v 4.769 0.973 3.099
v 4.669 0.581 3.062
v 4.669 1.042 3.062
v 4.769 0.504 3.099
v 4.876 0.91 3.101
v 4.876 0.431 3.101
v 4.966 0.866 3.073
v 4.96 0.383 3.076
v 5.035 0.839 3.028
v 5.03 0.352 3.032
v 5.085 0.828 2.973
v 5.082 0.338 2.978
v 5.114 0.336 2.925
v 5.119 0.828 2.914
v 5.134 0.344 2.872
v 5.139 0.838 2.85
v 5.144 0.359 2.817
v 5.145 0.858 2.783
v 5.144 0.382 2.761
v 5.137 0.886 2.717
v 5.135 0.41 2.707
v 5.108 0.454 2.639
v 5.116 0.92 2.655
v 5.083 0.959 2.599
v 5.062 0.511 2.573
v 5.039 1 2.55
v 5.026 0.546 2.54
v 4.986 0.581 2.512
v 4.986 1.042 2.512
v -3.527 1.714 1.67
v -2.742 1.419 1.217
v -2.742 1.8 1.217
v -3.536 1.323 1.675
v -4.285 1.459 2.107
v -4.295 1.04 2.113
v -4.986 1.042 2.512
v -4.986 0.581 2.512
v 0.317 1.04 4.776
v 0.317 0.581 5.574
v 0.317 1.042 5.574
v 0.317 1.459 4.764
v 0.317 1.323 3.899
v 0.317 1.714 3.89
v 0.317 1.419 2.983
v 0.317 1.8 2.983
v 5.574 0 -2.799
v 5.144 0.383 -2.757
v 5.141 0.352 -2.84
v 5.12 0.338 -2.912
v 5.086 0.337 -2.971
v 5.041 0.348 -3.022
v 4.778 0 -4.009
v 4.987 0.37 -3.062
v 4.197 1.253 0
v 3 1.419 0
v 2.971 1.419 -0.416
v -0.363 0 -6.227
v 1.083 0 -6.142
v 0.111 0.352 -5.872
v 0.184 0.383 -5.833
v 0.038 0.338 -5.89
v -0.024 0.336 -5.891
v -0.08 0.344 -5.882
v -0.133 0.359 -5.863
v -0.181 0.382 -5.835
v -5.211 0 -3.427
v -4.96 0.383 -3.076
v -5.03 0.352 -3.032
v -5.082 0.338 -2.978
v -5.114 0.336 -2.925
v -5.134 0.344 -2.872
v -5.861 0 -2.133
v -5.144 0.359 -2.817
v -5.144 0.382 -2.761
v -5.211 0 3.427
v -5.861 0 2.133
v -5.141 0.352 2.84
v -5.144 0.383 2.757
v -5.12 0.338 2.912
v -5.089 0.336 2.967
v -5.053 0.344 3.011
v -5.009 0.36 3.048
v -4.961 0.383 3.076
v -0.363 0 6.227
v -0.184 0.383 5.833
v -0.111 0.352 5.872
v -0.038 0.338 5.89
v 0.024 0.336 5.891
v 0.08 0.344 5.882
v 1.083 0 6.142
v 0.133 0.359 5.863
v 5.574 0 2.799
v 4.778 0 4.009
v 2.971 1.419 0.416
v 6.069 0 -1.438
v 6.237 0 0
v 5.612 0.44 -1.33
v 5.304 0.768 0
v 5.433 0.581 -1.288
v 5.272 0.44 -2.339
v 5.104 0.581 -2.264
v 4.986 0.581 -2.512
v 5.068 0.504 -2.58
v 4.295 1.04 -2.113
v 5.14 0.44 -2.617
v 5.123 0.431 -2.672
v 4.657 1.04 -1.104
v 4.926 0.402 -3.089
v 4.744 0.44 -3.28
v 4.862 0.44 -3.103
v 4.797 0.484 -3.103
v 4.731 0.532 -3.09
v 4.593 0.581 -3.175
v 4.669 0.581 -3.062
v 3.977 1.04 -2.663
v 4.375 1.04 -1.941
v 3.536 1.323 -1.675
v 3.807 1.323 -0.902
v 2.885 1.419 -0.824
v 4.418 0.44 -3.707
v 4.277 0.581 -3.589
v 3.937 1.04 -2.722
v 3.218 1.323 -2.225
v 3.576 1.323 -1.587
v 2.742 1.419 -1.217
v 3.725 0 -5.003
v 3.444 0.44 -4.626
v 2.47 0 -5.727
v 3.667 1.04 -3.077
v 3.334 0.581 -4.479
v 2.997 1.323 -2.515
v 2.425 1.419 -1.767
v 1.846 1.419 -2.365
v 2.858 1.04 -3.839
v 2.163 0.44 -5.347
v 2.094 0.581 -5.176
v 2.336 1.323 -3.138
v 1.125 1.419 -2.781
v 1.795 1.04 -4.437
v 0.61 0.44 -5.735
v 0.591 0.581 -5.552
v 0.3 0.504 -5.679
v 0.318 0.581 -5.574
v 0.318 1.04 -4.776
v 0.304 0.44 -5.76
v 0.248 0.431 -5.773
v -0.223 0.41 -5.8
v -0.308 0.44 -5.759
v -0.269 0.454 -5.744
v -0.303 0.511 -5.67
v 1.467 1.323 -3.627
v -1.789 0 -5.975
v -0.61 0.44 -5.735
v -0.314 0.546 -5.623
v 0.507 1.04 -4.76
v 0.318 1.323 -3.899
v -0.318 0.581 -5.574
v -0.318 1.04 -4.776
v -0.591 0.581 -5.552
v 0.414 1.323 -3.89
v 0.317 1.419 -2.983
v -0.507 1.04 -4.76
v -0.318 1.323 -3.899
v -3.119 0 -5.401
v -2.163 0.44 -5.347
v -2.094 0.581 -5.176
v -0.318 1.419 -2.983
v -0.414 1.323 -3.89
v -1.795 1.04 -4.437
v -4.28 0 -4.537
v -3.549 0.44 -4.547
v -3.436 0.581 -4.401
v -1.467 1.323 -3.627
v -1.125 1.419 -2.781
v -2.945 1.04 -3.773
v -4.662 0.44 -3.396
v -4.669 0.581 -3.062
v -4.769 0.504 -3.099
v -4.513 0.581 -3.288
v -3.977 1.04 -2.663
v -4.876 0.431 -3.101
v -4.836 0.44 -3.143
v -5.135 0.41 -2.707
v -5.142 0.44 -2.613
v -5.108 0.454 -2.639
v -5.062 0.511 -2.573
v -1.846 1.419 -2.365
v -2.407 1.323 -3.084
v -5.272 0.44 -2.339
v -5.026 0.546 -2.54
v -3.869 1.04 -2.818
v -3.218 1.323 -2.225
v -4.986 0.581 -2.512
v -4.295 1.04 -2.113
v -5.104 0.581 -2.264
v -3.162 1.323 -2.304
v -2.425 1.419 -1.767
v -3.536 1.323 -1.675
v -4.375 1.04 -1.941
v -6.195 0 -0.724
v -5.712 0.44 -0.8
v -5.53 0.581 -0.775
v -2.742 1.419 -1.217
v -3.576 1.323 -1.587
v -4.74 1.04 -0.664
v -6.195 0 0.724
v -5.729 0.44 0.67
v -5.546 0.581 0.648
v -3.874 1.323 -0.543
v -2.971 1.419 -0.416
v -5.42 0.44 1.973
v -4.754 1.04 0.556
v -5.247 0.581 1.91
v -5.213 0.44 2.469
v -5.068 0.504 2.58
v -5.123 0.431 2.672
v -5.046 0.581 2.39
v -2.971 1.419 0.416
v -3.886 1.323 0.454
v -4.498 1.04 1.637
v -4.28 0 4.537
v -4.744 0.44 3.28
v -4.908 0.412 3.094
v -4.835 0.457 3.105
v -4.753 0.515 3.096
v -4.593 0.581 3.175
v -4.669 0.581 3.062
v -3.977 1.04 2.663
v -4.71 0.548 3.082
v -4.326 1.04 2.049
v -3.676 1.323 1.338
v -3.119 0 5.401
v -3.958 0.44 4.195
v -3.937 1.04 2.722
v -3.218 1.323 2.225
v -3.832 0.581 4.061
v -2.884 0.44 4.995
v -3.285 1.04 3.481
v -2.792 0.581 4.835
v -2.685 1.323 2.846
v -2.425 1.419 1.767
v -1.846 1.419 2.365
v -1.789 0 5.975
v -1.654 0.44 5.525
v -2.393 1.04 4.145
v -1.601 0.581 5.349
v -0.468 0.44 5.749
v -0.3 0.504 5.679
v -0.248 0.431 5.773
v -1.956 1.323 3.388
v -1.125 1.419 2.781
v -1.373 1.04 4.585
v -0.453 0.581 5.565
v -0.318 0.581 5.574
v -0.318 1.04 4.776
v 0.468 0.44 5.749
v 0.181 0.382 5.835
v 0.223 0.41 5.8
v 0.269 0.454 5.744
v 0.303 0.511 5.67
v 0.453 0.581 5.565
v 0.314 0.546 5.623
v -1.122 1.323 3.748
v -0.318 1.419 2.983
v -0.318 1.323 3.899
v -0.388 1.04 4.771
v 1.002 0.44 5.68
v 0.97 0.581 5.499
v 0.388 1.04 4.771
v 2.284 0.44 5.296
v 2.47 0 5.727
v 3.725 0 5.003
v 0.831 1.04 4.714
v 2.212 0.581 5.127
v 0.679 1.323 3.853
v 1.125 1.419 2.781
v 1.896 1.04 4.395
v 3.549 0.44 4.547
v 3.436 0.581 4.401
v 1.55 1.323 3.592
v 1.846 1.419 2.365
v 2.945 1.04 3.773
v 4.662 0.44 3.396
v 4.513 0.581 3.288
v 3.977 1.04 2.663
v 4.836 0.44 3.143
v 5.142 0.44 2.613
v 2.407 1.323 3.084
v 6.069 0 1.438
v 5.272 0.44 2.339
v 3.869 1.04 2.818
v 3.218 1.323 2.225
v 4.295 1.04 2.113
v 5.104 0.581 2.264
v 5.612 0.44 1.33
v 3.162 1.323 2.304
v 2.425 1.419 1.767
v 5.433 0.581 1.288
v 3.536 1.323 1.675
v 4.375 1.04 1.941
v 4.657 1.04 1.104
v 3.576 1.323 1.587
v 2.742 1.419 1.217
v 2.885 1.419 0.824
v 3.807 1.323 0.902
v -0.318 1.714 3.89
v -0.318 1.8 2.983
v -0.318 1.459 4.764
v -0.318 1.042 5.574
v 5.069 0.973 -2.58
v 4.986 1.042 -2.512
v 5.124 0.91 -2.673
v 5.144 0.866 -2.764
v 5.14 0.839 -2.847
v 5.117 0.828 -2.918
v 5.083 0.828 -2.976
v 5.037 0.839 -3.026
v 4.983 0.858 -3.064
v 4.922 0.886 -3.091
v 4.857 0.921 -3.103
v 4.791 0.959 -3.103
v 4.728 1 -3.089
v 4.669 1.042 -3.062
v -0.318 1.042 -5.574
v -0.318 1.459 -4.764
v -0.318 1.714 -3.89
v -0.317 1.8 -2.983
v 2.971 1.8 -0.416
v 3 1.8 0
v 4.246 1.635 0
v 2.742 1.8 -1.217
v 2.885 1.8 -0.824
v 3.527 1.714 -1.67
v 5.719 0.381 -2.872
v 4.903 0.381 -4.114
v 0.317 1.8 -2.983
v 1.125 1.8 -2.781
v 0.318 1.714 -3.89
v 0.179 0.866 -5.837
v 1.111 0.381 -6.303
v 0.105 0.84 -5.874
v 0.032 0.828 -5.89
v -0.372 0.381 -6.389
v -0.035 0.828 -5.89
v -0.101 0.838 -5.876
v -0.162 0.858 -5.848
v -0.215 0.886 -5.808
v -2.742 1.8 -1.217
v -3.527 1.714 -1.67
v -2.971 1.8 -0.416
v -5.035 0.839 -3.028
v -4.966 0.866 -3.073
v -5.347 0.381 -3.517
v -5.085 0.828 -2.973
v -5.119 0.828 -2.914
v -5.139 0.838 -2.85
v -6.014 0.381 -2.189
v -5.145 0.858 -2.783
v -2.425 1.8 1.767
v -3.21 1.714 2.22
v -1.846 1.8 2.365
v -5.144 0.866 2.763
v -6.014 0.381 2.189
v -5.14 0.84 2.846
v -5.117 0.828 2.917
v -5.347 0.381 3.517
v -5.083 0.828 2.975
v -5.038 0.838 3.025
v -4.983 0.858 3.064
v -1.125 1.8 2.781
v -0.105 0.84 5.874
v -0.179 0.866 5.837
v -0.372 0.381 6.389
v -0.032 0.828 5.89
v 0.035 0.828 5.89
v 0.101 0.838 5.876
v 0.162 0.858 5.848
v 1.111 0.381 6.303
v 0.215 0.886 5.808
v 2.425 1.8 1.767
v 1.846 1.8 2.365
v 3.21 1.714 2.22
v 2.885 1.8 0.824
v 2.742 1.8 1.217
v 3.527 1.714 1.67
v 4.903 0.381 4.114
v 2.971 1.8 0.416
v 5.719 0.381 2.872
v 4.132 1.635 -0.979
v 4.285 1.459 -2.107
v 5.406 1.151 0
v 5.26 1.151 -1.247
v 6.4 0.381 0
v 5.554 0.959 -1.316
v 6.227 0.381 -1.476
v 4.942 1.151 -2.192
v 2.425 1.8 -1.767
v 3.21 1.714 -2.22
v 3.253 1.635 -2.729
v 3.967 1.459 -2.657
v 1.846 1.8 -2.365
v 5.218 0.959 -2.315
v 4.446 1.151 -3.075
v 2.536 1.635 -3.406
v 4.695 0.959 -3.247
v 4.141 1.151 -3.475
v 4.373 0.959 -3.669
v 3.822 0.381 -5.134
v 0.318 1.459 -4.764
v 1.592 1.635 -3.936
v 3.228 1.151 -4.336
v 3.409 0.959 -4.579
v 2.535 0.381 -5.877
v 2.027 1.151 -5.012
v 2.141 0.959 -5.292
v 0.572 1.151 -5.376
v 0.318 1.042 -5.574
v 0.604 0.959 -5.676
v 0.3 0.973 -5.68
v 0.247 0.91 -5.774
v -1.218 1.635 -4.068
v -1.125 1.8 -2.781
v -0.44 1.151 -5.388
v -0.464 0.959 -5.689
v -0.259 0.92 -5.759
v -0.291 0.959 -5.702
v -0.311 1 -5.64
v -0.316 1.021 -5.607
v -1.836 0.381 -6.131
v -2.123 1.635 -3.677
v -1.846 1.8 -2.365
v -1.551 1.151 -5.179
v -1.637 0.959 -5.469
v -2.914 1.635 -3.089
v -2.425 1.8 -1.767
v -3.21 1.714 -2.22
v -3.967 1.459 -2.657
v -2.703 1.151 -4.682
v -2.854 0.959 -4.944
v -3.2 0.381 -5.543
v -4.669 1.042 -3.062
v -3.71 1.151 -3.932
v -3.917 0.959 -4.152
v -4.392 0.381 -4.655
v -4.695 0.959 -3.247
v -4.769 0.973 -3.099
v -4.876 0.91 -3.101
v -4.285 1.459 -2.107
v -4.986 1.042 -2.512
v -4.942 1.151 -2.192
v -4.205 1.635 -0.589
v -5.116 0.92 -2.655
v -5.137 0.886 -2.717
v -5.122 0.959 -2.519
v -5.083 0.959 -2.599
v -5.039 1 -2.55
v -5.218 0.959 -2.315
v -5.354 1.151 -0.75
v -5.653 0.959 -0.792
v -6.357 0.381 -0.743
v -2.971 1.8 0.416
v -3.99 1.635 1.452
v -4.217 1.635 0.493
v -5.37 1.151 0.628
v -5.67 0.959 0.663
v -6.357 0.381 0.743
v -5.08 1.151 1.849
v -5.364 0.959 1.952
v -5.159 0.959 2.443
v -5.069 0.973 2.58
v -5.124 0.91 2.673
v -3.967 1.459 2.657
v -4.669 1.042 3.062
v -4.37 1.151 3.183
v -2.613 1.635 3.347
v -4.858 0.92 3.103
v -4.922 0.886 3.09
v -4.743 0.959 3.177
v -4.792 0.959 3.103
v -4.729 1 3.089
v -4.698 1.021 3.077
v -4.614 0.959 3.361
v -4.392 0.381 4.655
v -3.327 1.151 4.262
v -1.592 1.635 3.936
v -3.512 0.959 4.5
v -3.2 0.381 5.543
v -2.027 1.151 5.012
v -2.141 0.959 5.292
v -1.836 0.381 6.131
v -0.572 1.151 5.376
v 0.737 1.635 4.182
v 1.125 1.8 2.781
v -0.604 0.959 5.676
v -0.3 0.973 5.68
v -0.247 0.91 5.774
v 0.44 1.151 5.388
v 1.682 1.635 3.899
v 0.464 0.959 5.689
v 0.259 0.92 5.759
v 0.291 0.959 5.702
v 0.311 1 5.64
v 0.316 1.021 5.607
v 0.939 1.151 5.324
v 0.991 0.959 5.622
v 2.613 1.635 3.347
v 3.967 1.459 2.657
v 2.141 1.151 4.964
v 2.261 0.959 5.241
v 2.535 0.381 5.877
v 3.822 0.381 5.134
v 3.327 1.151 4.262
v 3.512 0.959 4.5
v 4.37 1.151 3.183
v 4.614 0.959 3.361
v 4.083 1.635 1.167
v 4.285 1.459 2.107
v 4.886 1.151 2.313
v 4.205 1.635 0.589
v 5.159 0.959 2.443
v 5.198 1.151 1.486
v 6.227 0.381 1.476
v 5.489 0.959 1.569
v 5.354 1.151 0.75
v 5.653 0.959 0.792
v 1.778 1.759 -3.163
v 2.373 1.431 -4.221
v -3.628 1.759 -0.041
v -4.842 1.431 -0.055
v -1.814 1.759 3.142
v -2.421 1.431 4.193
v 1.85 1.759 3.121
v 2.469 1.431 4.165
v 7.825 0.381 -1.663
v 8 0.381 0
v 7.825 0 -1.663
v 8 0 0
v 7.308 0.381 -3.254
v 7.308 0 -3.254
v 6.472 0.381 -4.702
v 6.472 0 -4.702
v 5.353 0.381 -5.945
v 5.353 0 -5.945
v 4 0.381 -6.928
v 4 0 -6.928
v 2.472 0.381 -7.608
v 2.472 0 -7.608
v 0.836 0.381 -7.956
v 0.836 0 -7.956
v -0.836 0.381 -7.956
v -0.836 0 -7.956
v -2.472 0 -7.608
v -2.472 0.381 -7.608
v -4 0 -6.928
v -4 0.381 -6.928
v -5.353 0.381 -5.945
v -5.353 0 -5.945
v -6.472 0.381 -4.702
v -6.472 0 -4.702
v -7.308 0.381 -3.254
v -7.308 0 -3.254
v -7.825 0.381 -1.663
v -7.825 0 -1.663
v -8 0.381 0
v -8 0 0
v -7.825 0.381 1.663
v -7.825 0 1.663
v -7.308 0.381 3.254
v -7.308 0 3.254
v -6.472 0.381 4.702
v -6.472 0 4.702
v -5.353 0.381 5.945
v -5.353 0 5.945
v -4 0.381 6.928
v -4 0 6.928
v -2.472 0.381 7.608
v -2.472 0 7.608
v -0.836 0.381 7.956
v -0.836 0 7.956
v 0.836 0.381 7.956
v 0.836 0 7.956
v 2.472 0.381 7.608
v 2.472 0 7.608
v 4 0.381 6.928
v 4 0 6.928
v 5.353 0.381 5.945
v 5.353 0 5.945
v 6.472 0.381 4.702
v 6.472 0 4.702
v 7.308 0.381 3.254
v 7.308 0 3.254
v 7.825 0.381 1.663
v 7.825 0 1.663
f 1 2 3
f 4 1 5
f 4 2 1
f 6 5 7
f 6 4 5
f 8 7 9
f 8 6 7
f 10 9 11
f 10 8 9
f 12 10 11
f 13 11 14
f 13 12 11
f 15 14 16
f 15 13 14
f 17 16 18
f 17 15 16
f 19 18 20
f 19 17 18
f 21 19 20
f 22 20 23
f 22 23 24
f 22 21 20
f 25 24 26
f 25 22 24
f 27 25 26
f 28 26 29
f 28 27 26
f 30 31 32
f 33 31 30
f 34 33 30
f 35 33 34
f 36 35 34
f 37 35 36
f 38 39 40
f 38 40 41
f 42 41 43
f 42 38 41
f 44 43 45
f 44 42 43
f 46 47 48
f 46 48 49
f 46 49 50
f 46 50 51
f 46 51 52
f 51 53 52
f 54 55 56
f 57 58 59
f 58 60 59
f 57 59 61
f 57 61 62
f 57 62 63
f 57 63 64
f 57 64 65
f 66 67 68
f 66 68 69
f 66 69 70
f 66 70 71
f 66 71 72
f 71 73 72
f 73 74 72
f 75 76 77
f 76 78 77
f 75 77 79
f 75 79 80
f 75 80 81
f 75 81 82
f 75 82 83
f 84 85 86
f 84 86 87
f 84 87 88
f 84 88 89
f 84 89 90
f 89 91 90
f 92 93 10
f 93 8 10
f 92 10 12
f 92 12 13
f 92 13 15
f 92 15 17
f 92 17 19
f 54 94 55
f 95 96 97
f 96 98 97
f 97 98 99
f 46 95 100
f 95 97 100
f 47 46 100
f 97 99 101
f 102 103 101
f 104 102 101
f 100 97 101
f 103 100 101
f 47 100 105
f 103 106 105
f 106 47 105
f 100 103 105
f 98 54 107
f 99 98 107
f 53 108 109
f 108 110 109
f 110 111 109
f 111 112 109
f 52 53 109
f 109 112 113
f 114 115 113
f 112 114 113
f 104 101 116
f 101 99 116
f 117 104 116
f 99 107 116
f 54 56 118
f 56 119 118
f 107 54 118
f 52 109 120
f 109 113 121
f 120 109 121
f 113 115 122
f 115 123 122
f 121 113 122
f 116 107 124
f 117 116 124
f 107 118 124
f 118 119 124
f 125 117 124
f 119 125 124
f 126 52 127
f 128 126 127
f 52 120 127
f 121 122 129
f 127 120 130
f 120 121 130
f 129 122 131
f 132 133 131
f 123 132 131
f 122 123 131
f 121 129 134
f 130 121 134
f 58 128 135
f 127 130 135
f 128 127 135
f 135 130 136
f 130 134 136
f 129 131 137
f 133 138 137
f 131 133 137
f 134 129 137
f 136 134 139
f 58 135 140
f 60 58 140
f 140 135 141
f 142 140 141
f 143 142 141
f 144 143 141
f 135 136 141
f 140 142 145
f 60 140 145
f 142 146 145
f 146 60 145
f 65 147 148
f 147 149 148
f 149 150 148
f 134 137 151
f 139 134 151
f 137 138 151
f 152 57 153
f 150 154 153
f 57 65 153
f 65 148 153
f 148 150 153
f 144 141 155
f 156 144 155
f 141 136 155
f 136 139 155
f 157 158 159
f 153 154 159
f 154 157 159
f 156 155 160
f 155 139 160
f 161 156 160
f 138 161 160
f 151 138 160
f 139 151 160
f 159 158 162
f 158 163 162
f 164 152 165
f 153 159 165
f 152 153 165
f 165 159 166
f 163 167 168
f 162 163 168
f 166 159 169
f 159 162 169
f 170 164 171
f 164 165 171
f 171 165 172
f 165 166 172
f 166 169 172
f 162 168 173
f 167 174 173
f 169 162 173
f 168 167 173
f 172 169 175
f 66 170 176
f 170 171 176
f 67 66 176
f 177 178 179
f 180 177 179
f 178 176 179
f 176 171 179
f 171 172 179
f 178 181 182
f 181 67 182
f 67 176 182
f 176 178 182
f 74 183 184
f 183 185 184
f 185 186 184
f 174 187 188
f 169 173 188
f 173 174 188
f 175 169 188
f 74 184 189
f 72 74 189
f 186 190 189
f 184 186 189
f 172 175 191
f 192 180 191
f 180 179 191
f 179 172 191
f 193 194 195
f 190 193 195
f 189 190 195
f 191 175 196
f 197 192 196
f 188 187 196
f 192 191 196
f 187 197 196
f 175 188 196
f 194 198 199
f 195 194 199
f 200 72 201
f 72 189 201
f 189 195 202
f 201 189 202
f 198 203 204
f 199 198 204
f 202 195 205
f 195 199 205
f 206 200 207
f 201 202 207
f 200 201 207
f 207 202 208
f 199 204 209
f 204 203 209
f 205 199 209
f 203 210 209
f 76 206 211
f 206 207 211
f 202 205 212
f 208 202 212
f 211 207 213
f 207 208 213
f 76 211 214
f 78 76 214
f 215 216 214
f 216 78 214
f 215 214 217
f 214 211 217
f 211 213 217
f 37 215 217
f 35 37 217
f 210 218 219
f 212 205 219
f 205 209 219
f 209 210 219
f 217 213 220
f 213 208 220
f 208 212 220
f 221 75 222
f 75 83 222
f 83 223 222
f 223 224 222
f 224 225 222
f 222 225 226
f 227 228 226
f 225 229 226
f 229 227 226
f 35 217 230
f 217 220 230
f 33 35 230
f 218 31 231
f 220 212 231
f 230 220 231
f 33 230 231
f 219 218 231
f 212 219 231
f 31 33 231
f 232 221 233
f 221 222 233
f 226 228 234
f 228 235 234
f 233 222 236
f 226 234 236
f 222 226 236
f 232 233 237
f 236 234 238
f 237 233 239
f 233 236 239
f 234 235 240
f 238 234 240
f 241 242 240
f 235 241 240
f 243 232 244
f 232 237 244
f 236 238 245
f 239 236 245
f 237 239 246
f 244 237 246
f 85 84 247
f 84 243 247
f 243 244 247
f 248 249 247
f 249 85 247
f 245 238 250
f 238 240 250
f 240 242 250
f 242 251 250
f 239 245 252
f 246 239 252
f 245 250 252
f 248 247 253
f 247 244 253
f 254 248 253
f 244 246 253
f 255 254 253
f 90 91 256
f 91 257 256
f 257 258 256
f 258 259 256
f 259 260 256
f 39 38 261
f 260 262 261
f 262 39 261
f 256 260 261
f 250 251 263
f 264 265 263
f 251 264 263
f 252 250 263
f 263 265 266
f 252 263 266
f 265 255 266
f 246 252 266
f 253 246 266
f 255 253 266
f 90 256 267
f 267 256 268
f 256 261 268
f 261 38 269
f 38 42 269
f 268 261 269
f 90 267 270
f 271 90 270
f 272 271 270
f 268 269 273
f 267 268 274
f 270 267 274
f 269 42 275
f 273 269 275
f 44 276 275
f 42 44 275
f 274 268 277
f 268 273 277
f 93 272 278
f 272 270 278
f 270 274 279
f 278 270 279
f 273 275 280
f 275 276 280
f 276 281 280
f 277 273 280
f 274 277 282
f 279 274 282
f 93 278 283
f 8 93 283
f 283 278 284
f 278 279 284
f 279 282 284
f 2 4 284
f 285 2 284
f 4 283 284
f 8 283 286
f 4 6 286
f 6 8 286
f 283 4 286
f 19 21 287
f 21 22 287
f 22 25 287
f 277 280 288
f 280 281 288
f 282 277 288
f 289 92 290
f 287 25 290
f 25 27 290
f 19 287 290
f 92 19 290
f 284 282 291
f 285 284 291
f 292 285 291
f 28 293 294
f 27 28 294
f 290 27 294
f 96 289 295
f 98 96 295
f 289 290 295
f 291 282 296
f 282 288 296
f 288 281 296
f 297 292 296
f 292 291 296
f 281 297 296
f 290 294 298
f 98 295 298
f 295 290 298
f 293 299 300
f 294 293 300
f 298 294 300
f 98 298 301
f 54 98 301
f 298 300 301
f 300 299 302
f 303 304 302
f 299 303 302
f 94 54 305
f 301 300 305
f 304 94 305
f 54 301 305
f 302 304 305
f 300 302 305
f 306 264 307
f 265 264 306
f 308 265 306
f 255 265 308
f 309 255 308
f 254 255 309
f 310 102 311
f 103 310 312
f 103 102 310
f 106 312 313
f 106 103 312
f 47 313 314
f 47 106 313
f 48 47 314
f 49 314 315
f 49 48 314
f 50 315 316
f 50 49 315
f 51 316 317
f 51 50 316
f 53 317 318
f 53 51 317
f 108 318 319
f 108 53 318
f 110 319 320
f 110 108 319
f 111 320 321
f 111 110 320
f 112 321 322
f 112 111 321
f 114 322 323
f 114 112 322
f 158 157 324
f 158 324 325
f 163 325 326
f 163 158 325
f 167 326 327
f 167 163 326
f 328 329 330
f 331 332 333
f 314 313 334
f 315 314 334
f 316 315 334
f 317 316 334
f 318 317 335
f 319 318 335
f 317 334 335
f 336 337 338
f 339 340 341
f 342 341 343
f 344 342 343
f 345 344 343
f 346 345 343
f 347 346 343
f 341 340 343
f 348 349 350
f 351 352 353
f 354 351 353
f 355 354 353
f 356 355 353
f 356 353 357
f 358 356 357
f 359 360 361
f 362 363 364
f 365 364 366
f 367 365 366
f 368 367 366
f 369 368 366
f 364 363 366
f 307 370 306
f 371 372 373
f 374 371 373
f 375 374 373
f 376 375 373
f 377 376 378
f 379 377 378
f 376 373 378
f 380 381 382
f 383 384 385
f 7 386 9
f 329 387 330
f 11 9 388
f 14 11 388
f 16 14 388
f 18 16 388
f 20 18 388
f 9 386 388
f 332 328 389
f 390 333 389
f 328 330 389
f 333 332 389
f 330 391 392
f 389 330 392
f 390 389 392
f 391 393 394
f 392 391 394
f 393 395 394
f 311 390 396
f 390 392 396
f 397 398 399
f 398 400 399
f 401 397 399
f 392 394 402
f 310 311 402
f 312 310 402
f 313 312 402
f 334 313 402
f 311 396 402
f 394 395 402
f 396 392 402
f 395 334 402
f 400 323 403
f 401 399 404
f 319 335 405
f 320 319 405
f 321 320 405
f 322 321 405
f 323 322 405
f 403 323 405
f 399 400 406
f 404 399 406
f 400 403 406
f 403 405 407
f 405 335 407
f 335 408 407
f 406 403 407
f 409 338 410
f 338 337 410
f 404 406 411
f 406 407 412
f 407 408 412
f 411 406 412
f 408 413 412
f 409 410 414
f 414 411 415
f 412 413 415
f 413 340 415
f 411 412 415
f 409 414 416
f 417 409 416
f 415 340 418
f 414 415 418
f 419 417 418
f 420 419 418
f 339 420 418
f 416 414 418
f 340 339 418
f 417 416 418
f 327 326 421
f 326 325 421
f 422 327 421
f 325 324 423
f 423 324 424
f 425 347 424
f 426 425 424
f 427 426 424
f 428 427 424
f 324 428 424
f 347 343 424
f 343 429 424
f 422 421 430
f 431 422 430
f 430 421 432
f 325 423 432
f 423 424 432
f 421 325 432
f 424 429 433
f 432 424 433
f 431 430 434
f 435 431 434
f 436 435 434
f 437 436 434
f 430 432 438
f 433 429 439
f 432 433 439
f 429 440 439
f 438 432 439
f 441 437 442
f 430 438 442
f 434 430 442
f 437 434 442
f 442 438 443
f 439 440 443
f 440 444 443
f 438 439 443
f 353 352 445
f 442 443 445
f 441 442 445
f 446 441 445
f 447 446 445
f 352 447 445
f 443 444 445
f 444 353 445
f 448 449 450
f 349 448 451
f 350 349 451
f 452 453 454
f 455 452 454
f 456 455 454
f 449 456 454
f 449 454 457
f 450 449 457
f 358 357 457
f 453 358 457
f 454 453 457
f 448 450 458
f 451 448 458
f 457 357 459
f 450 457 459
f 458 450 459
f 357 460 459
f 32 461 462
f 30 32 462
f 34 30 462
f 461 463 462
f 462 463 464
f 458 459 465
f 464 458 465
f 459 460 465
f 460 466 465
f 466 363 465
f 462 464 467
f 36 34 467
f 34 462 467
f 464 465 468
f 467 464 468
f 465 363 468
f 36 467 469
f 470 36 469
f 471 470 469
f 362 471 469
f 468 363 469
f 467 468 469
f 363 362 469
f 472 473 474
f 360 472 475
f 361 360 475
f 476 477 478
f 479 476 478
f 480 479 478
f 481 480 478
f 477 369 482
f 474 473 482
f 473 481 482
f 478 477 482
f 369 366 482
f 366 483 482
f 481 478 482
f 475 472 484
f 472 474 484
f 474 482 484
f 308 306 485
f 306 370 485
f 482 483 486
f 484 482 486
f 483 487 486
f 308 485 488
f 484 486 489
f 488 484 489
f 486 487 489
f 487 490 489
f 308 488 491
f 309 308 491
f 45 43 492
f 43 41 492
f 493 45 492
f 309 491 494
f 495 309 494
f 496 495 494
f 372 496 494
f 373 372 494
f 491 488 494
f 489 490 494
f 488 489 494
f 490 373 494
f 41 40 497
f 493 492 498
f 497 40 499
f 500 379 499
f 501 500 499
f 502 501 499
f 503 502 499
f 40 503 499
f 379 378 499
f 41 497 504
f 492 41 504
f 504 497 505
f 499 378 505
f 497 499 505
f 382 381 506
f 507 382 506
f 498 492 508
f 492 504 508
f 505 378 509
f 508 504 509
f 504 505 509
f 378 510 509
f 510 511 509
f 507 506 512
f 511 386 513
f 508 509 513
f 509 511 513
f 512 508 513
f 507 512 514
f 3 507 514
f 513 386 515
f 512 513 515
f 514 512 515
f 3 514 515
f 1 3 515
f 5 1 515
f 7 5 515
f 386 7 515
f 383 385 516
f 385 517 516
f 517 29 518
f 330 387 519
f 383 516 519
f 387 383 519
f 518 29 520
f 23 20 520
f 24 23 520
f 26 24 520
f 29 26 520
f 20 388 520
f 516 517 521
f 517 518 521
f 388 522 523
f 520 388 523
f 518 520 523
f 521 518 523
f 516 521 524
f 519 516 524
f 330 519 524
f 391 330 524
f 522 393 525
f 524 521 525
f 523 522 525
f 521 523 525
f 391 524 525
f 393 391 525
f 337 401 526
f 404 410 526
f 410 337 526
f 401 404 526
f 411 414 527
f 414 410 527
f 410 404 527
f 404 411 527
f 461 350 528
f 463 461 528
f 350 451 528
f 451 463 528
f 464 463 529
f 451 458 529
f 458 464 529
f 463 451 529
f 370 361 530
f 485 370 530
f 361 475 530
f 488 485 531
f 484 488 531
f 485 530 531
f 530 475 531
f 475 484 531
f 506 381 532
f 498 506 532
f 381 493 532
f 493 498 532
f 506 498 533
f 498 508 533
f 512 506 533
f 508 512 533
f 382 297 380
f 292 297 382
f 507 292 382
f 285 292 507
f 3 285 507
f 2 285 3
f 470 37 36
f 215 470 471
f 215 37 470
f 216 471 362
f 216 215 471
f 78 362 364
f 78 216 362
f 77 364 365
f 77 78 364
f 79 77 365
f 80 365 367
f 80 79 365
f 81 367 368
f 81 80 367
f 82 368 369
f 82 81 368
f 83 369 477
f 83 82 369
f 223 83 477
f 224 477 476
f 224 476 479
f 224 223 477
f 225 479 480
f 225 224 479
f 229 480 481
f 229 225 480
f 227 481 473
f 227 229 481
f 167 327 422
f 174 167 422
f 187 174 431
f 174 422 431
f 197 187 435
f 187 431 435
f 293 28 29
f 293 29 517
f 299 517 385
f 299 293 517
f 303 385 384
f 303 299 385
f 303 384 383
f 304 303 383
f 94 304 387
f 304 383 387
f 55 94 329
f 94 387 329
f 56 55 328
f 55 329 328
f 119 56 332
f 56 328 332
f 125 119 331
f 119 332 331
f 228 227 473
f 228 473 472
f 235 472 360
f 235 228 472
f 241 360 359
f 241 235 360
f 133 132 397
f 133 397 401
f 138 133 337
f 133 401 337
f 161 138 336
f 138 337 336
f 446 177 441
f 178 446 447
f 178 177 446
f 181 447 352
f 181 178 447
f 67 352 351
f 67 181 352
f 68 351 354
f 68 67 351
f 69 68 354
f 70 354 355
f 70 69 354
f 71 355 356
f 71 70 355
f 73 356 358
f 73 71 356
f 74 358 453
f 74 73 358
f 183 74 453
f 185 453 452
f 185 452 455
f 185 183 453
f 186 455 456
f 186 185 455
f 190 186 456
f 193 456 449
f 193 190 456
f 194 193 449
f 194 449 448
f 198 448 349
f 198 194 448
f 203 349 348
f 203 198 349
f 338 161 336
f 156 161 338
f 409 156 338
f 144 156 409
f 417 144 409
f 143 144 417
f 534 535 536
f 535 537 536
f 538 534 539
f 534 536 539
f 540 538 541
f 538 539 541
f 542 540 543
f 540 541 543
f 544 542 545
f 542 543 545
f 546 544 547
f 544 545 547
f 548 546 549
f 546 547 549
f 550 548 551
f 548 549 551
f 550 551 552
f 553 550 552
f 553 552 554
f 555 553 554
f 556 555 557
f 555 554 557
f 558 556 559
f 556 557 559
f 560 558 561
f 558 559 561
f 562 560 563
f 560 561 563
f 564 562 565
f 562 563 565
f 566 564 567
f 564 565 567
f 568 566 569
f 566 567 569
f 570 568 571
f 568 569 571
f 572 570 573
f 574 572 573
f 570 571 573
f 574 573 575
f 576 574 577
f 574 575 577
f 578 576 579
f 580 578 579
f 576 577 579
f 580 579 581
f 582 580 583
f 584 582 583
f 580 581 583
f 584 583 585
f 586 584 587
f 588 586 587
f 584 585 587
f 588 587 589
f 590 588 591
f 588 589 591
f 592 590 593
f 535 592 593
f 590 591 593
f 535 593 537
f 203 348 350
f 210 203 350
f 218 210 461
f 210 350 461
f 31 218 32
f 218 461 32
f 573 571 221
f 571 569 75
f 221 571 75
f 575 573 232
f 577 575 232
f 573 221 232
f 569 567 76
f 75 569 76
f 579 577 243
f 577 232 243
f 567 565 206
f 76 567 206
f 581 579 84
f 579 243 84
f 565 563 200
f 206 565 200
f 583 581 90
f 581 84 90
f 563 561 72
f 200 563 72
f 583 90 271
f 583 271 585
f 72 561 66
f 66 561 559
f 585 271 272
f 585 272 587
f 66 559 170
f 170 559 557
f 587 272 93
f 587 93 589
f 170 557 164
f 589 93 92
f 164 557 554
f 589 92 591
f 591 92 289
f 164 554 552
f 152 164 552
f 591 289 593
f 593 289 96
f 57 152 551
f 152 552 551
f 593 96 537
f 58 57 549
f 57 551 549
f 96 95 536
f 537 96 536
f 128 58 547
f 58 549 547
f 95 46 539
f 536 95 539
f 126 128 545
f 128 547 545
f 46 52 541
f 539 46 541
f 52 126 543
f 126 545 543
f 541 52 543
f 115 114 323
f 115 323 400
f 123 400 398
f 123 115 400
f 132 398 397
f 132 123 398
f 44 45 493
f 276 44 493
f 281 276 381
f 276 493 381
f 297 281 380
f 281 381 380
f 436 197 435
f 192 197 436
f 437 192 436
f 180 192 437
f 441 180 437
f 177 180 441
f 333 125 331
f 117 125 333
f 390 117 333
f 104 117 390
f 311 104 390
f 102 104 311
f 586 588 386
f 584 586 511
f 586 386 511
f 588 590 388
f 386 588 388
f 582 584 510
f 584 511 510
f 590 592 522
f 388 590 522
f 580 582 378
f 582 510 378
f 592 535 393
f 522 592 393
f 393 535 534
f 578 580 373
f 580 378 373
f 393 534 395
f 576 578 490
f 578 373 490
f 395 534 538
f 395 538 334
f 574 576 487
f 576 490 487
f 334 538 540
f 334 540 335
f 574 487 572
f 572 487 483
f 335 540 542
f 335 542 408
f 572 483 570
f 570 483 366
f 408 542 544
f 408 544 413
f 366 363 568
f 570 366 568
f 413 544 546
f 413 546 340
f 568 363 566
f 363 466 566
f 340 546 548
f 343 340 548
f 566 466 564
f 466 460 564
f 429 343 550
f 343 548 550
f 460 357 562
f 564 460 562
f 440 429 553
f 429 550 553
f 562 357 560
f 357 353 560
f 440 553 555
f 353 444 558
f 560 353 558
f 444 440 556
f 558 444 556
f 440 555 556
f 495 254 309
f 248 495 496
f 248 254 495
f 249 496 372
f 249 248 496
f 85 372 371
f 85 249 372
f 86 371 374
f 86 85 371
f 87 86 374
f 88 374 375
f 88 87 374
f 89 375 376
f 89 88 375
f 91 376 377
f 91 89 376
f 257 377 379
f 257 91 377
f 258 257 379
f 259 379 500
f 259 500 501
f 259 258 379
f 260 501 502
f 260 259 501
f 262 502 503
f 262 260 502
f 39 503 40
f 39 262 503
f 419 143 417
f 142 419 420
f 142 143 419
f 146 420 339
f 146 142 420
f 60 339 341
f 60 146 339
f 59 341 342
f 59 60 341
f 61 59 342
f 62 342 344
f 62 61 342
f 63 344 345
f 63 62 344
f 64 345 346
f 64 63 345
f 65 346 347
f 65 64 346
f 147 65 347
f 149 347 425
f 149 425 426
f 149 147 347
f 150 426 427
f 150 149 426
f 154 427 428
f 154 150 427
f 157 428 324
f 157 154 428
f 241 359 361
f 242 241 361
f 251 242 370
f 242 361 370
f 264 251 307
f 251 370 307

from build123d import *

# Parameters (mm, degrees)
CUT_EXTRUDE1_DEPTH = 12.456002809
CIRPATTERN1_COUNT  = 6


with BuildPart() as part:
    # Sketch2 → Revolve1 (revolve)
    with BuildSketch(Plane.XY, mode=Mode.PRIVATE) as revolve1_sk:
        with BuildLine():
            Line((-8, 0), (-6.237085417, 0))
            ThreePointArc((-6.237085417, 0), (-4.767221194, 1.048671922), (-3, 1.419))
            Line((-3, 1.419), (-3, 1.8))
            ThreePointArc((-3, 1.8), (-4.842115699, 1.431016827), (-6.4, 0.381))
            Line((-6.4, 0.381), (-8, 0.381))
            Line((-8, 0.381), (-8, 0))
        make_face()
    revolve(revolve1_sk.sketch.rotate(Axis((0, 0, 0), (0, 1, 0)), 180), axis=Axis((0, 0, 0), (0, 1, 0)))

    # Sketch3 → Cut-Extrude1 (cut, through all)
    with BuildSketch(Plane(origin=(0, 0, 0), x_dir=(1, 0, 0), z_dir=(0, 1, 0))):
        with BuildLine():
            Line((-0.3175, 5.5745), (-0.3175, 0))
            Line((-0.3175, 0), (0.3175, 0))
            Line((0.3175, 0), (0.3175, 5.5745))
            ThreePointArc((0.3175, 5.5745), (0, 5.892), (-0.3175, 5.5745))
        make_face()
    cut_extrude1 = extrude(amount=CUT_EXTRUDE1_DEPTH, mode=Mode.SUBTRACT)

    # CirPattern1: Cut-Extrude1 ×6 about axis
    cirpattern1_axis = Axis((0, 0, 0), (0, 1, 0))
    for i in range(1, CIRPATTERN1_COUNT):
        add(cut_extrude1.rotate(cirpattern1_axis, i * 360 / CIRPATTERN1_COUNT), mode=Mode.SUBTRACT)


solid = part.part
